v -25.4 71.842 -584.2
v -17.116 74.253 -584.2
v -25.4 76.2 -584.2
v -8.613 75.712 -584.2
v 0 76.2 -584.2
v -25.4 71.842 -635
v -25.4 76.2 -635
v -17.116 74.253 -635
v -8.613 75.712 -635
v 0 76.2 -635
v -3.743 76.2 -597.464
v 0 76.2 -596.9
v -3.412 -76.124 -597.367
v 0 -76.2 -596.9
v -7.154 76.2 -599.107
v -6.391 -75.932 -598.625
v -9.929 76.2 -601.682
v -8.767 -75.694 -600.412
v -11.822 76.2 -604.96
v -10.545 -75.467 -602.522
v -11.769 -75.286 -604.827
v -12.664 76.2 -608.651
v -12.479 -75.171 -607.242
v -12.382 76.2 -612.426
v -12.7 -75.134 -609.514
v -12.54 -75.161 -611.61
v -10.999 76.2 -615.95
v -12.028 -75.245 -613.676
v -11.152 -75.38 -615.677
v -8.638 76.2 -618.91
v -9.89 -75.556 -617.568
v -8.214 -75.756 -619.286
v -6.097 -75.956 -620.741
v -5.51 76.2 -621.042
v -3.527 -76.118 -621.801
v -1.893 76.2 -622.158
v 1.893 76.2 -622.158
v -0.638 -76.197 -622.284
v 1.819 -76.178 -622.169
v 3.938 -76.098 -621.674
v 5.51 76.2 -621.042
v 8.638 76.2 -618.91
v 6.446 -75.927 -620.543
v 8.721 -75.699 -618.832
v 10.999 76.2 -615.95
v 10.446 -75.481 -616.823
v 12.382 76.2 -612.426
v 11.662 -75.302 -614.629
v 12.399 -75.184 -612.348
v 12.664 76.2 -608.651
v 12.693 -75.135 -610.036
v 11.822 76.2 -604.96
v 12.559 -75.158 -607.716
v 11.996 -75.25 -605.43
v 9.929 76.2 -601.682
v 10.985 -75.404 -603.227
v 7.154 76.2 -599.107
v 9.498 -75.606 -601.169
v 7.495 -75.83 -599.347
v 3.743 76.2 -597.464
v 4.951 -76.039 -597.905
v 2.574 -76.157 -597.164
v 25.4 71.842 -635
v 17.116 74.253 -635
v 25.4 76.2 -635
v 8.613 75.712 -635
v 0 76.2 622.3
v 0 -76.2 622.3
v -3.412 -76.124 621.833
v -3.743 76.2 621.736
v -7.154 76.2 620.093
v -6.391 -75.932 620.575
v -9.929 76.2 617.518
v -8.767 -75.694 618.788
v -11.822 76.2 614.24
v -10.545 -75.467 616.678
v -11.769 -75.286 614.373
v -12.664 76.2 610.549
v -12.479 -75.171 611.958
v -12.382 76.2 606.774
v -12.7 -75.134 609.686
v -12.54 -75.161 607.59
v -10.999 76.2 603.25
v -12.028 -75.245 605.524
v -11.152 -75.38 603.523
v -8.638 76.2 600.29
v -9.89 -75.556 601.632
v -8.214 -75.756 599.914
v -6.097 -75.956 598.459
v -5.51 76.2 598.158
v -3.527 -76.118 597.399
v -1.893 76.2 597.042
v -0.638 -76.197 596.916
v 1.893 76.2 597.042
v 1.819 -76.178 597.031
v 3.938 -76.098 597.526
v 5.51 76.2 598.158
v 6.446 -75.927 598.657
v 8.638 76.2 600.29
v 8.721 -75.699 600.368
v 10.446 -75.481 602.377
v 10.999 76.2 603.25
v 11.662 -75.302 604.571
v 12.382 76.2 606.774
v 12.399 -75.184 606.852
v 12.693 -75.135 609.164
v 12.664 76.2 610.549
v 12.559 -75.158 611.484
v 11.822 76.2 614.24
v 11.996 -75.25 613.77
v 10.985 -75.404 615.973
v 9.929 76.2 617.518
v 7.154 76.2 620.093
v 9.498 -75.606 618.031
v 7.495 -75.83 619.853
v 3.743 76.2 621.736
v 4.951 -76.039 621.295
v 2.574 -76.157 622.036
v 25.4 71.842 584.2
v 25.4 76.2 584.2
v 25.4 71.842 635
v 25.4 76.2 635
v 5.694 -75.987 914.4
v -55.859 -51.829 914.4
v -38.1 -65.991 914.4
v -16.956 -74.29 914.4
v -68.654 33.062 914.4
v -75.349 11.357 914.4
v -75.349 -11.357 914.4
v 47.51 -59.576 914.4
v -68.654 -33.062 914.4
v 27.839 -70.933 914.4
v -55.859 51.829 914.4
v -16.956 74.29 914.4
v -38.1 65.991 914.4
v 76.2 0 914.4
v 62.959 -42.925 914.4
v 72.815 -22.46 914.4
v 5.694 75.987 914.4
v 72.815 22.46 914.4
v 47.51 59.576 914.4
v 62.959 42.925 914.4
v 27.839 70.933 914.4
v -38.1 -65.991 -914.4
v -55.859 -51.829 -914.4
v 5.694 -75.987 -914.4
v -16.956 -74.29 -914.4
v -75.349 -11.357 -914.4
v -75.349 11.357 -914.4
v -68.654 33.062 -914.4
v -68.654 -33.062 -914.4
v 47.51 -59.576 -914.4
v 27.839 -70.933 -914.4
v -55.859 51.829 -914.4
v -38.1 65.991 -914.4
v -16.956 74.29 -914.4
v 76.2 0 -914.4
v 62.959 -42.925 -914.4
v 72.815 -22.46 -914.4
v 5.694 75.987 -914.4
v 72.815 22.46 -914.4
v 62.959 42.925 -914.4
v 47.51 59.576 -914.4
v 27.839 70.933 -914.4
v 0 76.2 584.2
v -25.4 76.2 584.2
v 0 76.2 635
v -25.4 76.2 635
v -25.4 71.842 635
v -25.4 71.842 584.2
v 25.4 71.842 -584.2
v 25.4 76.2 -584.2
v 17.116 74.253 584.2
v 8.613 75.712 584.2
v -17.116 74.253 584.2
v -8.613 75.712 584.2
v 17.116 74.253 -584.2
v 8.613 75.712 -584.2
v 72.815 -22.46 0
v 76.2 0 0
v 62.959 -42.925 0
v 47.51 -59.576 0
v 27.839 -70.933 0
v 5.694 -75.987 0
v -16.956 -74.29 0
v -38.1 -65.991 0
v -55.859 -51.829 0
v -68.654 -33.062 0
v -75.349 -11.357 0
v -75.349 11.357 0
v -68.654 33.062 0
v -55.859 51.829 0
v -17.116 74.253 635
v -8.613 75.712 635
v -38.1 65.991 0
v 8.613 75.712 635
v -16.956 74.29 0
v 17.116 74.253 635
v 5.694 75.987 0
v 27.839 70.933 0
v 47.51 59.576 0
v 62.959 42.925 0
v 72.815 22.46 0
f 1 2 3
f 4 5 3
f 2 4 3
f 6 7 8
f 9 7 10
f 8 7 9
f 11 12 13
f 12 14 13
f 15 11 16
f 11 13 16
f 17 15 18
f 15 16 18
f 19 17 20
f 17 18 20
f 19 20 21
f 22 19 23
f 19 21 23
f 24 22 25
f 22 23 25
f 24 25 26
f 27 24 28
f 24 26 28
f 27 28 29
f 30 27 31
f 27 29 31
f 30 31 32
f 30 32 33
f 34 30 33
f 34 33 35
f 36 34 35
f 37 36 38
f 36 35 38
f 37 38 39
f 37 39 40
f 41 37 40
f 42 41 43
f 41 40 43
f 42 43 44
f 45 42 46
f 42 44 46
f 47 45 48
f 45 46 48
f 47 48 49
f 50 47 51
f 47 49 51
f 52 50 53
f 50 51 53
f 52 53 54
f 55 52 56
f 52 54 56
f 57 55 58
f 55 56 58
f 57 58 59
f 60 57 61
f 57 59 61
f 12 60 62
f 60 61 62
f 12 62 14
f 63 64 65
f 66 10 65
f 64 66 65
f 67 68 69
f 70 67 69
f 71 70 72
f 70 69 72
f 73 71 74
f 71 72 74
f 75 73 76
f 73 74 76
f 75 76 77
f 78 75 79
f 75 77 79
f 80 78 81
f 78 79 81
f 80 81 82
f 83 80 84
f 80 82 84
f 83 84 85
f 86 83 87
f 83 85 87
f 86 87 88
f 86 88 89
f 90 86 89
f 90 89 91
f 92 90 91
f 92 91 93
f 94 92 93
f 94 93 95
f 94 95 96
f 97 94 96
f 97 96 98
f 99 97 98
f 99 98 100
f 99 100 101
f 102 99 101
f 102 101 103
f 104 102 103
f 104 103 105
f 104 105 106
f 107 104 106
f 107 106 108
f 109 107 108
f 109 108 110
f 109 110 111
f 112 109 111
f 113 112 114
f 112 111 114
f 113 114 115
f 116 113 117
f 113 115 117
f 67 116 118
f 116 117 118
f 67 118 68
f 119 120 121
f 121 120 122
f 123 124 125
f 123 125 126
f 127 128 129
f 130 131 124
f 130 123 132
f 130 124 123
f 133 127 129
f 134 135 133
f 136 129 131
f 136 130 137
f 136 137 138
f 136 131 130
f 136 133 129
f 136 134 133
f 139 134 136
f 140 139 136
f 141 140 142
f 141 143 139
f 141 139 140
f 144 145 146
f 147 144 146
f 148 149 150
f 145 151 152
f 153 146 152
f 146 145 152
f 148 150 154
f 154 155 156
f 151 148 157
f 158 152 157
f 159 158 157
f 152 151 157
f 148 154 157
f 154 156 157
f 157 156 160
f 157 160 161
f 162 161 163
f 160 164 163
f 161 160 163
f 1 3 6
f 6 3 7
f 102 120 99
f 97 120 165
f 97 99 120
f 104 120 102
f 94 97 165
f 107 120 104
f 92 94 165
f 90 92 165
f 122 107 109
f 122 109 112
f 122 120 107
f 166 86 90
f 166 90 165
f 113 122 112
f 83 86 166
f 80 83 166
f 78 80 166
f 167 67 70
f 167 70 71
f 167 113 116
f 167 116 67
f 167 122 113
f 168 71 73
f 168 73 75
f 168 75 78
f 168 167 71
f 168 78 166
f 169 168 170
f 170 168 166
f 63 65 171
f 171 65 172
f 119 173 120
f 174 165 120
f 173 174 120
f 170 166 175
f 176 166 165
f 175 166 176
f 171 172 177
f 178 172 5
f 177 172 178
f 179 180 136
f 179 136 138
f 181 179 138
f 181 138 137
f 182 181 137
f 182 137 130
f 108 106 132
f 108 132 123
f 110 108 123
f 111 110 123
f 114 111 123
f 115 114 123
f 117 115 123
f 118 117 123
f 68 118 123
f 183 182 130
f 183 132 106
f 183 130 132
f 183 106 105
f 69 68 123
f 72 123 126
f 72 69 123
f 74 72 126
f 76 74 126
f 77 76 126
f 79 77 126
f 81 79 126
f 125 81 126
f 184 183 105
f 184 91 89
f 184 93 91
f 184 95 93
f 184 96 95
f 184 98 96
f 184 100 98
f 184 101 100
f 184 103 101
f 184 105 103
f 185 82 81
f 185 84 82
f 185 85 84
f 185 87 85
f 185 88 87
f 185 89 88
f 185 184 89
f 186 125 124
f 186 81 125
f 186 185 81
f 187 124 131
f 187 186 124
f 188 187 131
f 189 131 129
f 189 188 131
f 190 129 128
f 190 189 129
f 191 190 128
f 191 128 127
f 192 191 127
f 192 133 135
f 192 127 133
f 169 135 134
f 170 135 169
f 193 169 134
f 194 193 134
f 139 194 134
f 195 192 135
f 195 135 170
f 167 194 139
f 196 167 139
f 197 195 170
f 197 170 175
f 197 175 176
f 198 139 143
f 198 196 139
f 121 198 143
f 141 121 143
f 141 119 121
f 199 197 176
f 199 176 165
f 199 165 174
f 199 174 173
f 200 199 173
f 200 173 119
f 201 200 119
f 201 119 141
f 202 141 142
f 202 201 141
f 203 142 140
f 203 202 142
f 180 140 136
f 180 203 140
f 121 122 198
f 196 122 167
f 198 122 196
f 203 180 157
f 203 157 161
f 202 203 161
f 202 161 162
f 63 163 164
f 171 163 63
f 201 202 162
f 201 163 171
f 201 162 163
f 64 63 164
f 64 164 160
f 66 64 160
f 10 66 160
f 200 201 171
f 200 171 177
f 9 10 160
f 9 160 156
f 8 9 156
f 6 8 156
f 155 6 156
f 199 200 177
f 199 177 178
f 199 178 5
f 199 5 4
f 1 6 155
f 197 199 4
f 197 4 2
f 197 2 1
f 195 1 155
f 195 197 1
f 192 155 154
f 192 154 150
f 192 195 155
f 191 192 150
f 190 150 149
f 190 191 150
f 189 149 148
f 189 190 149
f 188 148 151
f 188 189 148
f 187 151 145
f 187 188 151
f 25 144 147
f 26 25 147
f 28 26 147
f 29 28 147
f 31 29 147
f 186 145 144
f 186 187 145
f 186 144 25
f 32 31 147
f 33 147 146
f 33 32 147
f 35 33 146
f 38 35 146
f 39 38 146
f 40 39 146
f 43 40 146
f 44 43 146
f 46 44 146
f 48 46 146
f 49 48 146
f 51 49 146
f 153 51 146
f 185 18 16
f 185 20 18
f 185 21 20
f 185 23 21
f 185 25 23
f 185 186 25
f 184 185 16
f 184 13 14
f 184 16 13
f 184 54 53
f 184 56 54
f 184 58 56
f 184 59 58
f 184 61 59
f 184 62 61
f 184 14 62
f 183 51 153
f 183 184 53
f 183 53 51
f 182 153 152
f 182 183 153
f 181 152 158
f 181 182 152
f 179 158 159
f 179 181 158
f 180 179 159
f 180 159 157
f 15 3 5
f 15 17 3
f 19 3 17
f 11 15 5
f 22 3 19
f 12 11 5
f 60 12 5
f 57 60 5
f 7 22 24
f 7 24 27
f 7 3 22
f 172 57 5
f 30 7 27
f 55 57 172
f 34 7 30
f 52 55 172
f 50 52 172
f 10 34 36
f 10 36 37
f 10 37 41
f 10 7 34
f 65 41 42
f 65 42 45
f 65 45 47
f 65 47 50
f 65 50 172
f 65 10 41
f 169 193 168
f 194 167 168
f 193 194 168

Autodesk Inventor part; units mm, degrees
ref_plane "YZ Plane" through (0, 0, 0) normal (1, 0, 0) x (0, 1, 0)
ref_plane "XY Plane" through (0, 0, 0) normal (0, 0, 1) x (1, 0, 0)
sketch "Sketch1" plane through (0, 0, 0) normal (0, 0, 1) x (1, 0, 0)
  circle A0 centre (0, 0) radius 76.2
  dimension "d0" = 152.4
extrude "Extrusion1" add sketch "Sketch1" along normal mid plane 1828.8
ref_plane "Work Plane2" through (0, 76.2, 0) normal (0, 1, 0) x (-1, 0, 0)
sketch "Sketch4" plane through (0, 76.2, 0) normal (0, 1, 0) x (-1, 0, 0)
  line L0 (25.4, 635) -> (25.4, 584.2)
  line L1 (25.4, 584.2) -> (-25.4, 584.2)
  line L2 (-25.4, 584.2) -> (-25.4, 635)
  line L3 (-25.4, 635) -> (25.4, 635)
  line L4 (25.4, 635) -> (-25.4, 584.2) construction
  line L5 (25.4, 584.2) -> (-25.4, 635) construction
  line L6 (76.2, 914.4) -> (-76.2, 914.4) projected
  point P0 (0, 0)
  point P1 (0, 609.6)
  dimension "d17" = 50.8
  dimension "d19" = 304.8
extrude "Extrusion3" add sketch "Sketch4" against normal blind 25.4
mirror "Mirror1" about plane through (0, 0, 0) normal (0, 0, 1) of "Extrusion3"
sketch "Sketch5" plane through (0, 76.2, 0) normal (0, 1, 0) x (1, 0, 0)
  line L0 (76.2, 914.4) -> (-76.2, 914.4) projected
  line L1 (-76.2, -914.4) -> (76.2, -914.4) projected
  point P0 (0, 0)
  point P1 (0, -609.6)
  point P2 (0, 609.6)
  dimension "d22" = 304.8
  dimension "d23" = 304.8
hole "Hole2" at (0, 76.2, 609.6) at (0, 76.2, -609.6) direction (0, -1, 0) diameter 25.4 end through all
properties part number "CrossMember" material "Wood (Walnut)"
